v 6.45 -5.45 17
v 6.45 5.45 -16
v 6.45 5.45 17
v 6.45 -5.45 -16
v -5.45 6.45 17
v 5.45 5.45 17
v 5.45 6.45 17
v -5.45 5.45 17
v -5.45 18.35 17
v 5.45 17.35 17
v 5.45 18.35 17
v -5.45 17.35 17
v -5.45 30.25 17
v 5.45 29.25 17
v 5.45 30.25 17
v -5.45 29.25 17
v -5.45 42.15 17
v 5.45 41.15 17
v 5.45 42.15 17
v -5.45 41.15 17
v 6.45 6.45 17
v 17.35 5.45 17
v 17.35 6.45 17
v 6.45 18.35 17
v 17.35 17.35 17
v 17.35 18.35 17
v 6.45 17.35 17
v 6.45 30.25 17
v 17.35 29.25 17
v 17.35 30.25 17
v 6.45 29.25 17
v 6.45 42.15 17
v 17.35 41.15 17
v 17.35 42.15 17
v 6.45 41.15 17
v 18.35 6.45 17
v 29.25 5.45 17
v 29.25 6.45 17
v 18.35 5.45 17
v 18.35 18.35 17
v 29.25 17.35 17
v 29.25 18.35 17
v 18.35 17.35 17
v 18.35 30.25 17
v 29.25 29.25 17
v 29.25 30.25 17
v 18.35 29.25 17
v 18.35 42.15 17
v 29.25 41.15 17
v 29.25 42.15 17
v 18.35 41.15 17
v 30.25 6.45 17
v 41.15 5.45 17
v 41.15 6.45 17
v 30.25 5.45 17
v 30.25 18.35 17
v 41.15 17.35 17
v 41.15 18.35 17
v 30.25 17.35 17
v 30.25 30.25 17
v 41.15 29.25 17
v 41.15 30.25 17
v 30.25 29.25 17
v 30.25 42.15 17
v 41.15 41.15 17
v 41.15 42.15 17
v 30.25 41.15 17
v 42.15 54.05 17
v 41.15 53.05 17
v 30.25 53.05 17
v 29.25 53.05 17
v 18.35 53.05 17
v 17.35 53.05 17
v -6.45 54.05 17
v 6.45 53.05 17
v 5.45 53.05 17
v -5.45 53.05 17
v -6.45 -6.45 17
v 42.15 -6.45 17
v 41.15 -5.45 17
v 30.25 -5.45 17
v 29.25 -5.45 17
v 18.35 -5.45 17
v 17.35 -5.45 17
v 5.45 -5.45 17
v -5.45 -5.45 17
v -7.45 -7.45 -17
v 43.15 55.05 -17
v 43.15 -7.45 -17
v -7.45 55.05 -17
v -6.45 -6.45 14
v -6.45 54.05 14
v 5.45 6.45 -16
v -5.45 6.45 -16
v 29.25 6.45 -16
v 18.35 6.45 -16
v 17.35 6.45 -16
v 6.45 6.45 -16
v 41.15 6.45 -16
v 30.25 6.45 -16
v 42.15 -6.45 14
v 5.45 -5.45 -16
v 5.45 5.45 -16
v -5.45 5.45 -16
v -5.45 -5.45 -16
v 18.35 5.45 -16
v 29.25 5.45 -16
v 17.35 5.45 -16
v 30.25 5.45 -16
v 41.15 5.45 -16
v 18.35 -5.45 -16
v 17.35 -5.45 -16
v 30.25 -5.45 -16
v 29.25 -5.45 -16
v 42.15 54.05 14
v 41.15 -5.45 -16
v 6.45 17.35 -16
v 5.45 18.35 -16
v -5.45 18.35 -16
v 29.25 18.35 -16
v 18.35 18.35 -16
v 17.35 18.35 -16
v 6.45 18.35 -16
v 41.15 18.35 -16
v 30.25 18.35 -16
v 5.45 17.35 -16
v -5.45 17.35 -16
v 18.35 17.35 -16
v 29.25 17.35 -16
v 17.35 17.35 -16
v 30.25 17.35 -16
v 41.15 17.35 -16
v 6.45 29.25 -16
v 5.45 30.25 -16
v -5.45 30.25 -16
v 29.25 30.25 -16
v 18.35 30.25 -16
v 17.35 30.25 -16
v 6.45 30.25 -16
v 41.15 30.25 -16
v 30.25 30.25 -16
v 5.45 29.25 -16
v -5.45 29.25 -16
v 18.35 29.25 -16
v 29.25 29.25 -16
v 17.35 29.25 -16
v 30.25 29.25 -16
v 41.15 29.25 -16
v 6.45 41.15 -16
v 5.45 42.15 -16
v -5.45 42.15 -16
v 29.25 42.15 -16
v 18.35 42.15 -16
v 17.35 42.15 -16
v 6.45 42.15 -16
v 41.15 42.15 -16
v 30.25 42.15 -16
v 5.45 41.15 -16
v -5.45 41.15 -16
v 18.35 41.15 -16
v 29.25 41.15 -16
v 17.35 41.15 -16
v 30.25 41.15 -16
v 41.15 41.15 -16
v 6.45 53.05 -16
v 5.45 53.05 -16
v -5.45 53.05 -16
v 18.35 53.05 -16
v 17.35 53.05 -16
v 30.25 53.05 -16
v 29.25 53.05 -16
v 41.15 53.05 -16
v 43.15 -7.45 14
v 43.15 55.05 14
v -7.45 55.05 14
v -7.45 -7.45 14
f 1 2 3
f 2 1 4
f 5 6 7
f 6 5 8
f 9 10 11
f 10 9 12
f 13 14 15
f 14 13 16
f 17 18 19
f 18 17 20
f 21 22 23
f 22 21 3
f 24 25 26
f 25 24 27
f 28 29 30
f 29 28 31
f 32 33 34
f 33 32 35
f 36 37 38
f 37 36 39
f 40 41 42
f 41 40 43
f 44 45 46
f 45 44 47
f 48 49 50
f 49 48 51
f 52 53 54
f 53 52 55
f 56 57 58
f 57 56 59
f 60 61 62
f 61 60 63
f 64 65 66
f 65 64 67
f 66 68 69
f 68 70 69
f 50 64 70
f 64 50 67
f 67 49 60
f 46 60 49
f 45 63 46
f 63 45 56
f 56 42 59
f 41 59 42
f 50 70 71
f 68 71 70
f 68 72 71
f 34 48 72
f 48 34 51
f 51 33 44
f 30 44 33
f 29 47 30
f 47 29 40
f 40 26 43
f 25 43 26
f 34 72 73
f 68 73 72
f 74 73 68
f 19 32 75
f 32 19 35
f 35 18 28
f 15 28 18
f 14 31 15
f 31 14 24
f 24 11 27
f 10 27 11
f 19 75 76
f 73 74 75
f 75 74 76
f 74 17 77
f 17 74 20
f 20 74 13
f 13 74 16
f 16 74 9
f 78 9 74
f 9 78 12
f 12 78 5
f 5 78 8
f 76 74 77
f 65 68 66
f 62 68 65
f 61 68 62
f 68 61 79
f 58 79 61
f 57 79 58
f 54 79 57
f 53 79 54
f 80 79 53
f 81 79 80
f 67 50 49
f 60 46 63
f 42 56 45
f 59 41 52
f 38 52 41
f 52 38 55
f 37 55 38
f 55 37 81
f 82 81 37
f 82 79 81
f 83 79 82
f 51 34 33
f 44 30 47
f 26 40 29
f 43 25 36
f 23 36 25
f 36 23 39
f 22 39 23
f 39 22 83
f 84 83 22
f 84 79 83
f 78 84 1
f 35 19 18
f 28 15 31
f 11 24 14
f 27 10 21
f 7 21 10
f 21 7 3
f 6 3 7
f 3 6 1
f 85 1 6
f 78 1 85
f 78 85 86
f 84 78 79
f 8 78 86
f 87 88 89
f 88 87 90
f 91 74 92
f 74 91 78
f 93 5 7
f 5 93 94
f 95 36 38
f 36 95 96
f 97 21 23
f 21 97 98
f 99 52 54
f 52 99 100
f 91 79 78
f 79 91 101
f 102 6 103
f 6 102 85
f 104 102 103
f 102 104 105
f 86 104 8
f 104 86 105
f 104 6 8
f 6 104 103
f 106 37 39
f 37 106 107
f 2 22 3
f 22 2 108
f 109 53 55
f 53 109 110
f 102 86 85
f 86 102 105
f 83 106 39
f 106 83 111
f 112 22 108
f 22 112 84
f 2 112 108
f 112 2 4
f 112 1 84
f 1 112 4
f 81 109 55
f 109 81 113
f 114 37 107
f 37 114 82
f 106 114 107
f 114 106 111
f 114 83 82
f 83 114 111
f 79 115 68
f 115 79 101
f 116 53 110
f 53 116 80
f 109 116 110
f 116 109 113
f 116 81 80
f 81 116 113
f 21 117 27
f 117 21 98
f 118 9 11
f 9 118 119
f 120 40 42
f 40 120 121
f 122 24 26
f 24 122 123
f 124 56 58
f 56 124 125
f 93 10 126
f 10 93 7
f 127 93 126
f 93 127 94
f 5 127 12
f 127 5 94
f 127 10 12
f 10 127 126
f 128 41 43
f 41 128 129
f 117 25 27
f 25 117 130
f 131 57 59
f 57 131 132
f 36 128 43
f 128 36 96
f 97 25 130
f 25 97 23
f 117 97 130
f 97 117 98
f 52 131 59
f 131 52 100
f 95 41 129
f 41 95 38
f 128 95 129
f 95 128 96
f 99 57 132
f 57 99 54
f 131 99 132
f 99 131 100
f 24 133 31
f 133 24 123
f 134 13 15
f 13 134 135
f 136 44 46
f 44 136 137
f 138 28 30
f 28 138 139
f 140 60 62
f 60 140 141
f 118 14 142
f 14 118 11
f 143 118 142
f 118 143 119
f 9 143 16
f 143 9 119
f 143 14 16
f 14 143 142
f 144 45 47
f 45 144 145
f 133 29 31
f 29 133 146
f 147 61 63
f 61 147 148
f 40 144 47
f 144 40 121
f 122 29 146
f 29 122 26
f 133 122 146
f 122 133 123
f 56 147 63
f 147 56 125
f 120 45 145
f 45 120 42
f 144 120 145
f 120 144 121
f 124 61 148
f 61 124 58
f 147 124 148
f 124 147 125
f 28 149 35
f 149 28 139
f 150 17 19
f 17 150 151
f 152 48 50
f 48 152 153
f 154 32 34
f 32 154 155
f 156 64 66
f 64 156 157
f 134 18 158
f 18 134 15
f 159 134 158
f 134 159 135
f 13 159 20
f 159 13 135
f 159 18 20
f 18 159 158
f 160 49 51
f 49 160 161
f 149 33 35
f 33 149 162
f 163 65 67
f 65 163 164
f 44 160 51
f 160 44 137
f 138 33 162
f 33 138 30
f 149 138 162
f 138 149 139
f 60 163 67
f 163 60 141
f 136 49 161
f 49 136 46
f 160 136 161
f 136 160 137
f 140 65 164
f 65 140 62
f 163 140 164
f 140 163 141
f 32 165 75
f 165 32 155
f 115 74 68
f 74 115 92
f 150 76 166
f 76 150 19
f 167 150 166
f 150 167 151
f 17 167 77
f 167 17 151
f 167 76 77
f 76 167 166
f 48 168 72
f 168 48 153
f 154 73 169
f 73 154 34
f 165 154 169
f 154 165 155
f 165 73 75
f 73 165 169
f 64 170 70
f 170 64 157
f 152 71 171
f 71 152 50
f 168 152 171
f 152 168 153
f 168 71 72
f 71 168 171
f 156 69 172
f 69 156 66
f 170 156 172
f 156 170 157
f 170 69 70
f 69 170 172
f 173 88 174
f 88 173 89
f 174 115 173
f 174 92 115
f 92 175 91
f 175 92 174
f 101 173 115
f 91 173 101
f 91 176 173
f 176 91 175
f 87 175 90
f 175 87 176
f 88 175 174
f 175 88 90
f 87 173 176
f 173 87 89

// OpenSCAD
// desired ammount of cells -1
cells_x=4-1;
cells_y=5-1;

// model is made by difference in two  cubes, which means 
// the outer box (actuall physical boundary)
// should be a bit bigger than the empty box below
// difference will result in thicker/thiner walls
//
// this is desired size of the empty box (should depends on
// the type of battery you want. Please mind that no printer is 
// perfect, i.e. printer that makes 0.2mm lines will not always to 
// make walls in dimensions.
// think about it like adding 0.2-0.5mm tolerance to print.
// below are tested designs for european ni-mh batteries
// for AAA = [ h=34, d=10.9 ]
box_h=34;
box_d=10.9;

// desired (general) wall size
wall=1;

// wall used to make a lid holder
extwall=1;

// size difference used for lid to take hold on the box
// bigger difference means more plastic for a lid, but also more grip
dewall=3;

// used for calculations do not worry about those :)
// weird calculations start:
bigd=box_d+wall+wall;
bigh=box_h;
// small-d :D
smalld=box_d;
smallh=box_h;
dist=wall+smalld;

barx=(cells_x*smalld)+(cells_x*wall)+smalld+wall+wall;
bary=((cells_y+1)*smalld)+((cells_y+1)*wall)++wall;
walloff=wall/2;
xmid=(((cells_x-1)*wall)+((cells_x-1)*smalld))-(smalld/2)-(wall/2);
echo(xmid);
ymid=(((cells_y-1)*wall)+((cells_y-1)*smalld))-smalld-wall;
echo(ymid);

wallhalf=wall/2;
extwallhalf=extwall/2;
// weird calculations stop

// # make rims
// xwalls
translate([xmid,ymid+(bary/2)+extwallhalf,-((wall*dewall)/2)]){
  cube([barx+2*extwall,extwall,smallh-(wall*dewall)],center=true);
}
translate([xmid,ymid-(bary/2)-extwallhalf,-((wall*dewall)/2)]){
  cube([barx+2*extwall,extwall,smallh-(wall*dewall)],center=true);
}

// ywalls
translate([xmid+(barx/2)+extwallhalf,ymid,-((wall*dewall)/2)]){
  cube([extwall,bary+2*extwall,smallh-(wall*dewall)],center=true);
}
translate([xmid-(barx/2)-extwallhalf,ymid,-((wall*dewall)/2)]){
  cube([extwall,bary+2*extwall,smallh-(wall*dewall)],center=true);
}



//draw rim
//difference() {
  // for cells in y row
  for (t_y= [0:cells_y]) {
    // for cells in x row
    for (t_x= [0:cells_x]) {
      difference(){
        // big box:
        translate([dist*t_x,dist*t_y,0]) {
          cube([bigd,bigd,bigh], center=true);
        }
        // small box
        translate([dist*t_x,dist*t_y,0]) {
          translate([0,0,wall]) {
            cube([smalld,smalld,smallh], center=true);
          };
        }
      } // diff
    } // for x
  } // for y
